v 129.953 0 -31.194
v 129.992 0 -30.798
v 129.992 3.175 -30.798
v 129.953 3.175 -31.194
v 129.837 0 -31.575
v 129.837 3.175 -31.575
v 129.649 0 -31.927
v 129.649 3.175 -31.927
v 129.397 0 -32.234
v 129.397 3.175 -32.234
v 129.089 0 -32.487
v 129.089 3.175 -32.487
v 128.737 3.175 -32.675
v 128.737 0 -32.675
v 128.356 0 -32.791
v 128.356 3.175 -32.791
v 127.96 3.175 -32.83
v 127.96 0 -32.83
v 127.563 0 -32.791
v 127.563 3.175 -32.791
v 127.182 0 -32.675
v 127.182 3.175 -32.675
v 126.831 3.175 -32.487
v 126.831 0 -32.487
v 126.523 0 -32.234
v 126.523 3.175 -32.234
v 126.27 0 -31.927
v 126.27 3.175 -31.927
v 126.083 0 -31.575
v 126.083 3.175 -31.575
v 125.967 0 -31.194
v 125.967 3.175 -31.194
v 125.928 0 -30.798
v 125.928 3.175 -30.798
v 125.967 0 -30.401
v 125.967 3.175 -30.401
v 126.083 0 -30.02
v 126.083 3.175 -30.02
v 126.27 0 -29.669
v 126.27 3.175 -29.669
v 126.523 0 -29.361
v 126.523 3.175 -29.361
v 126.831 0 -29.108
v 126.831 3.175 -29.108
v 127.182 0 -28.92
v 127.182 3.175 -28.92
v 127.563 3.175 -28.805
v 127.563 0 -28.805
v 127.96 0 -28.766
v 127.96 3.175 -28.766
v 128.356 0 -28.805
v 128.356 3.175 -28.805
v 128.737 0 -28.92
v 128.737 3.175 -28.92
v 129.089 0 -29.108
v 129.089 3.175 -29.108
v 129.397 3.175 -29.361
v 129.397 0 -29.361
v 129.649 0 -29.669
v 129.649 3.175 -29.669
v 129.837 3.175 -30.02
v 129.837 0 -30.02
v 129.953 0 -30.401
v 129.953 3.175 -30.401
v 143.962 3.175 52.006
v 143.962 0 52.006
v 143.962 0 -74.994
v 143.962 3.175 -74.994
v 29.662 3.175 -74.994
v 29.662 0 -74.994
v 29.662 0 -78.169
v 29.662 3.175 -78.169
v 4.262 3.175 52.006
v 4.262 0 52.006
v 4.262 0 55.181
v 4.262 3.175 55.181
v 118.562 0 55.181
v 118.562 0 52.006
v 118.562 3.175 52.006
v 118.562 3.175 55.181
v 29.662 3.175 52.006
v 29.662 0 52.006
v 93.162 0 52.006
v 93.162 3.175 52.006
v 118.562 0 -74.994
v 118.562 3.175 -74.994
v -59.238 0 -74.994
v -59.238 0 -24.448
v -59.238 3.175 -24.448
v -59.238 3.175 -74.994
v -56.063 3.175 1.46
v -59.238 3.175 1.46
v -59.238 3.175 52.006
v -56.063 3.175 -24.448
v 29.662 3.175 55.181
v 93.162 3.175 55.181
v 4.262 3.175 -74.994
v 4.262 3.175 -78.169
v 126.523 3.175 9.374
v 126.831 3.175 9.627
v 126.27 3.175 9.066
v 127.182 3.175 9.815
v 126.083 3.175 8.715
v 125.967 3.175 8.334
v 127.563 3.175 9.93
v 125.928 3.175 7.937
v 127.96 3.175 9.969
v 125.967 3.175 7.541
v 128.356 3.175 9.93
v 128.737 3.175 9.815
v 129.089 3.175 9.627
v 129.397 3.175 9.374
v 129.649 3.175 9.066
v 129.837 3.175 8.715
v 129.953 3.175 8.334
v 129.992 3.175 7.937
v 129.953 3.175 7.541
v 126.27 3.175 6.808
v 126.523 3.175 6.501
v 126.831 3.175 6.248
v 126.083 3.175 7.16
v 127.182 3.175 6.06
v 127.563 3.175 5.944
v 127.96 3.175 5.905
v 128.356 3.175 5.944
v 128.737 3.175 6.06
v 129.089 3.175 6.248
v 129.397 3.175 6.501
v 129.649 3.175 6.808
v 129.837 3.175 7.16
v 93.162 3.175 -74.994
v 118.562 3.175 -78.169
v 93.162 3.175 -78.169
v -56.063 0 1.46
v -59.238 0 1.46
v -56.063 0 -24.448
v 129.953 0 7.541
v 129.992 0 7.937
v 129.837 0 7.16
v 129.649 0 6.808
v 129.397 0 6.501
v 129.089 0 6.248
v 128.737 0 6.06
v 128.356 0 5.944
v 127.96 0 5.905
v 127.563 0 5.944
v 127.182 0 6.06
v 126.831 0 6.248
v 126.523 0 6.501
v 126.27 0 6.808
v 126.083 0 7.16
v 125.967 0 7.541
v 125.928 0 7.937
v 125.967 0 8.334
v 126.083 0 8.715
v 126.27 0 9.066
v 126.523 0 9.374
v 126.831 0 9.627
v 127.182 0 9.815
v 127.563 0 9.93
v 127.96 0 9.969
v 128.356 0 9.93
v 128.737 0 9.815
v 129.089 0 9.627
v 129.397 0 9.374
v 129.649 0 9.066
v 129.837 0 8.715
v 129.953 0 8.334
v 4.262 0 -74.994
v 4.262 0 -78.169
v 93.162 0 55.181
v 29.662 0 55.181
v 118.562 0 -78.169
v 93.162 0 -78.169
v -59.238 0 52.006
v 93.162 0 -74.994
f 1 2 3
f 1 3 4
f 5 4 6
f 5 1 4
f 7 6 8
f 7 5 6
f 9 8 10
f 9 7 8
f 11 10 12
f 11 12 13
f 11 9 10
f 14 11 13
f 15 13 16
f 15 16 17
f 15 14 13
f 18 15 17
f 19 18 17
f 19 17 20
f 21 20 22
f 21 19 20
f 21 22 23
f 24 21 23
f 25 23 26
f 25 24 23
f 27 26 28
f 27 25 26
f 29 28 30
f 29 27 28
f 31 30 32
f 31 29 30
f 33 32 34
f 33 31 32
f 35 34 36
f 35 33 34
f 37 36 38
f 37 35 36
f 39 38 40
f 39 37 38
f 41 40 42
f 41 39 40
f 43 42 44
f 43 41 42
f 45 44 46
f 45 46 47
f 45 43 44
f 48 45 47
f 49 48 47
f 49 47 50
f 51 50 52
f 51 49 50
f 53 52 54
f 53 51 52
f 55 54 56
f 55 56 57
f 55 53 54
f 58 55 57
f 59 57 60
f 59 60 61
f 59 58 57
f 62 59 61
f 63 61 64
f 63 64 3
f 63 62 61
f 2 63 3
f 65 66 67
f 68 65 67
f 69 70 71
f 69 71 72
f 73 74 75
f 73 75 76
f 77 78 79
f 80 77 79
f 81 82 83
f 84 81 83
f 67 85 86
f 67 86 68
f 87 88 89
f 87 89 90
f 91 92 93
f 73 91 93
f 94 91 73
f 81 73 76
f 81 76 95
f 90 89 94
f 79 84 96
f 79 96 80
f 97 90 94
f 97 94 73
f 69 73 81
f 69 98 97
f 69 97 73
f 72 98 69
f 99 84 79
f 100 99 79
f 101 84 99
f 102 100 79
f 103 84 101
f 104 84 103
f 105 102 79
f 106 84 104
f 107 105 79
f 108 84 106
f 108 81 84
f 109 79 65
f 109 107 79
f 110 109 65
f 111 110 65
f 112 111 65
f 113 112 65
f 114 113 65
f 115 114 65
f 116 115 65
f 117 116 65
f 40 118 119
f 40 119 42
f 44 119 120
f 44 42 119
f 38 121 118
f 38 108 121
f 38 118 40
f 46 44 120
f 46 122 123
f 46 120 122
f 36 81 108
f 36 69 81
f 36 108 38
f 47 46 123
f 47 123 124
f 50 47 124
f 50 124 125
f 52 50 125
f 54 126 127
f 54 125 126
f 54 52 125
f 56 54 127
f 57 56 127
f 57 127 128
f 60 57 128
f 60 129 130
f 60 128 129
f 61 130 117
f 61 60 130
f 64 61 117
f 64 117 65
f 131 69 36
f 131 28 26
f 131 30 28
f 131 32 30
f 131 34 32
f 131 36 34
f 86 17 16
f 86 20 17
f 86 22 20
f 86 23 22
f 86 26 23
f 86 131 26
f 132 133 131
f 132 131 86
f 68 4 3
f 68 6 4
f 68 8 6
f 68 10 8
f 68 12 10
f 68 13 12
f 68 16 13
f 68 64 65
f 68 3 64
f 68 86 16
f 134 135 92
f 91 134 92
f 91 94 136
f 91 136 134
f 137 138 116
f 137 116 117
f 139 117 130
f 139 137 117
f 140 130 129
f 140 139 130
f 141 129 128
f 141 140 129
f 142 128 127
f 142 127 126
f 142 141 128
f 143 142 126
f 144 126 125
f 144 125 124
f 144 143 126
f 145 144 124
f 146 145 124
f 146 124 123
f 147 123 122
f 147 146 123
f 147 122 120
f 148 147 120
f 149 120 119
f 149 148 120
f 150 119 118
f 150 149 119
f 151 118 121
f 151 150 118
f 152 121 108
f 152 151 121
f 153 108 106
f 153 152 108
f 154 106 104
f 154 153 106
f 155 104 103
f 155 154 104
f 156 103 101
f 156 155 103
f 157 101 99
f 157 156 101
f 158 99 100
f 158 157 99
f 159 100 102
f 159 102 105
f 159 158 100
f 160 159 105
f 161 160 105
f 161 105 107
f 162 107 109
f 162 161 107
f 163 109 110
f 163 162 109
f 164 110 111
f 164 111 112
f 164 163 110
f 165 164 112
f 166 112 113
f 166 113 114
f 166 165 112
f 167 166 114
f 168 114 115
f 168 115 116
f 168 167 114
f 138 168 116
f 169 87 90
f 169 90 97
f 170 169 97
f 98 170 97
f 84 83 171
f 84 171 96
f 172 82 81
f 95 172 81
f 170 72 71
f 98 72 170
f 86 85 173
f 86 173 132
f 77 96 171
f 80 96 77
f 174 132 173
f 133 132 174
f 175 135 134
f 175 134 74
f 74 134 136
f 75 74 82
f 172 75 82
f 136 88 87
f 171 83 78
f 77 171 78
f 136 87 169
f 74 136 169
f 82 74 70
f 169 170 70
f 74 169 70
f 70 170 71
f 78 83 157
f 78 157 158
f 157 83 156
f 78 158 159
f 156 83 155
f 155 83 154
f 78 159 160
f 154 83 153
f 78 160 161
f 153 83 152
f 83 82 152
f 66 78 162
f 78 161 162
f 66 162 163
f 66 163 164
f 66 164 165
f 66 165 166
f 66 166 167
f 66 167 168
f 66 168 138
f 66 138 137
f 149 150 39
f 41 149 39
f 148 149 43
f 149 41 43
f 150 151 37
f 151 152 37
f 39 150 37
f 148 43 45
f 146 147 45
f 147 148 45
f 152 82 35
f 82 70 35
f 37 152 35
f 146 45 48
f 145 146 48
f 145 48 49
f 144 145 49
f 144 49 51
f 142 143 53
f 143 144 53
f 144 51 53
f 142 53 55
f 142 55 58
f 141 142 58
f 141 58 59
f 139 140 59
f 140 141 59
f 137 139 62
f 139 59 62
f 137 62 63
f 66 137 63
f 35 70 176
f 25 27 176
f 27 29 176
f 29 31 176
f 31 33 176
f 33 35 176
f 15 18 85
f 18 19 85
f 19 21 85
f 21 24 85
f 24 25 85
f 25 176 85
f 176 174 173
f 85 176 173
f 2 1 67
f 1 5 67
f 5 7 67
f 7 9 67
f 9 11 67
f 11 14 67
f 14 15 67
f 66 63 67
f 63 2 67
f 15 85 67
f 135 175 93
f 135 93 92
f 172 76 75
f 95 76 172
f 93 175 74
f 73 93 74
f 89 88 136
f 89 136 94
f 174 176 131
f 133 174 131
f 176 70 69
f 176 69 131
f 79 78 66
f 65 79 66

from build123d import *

# Parameters (mm, degrees)
SKETCH1_W           = 203.2
SKETCH1_H           = 127
SKETCH1_R           = 2.032
BOSS_EXTRUDE1_DEPTH = 3.175
SKETCH5_W           = 25.4
SKETCH5_H           = 3.175
BOSS_EXTRUDE2_DEPTH = 3.175
SKETCH6_W           = 25.4
SKETCH6_H           = 3.175
BOSS_EXTRUDE3_DEPTH = 3.175
SKETCH7_W           = 25.908
SKETCH7_H           = 3.175
CUT_EXTRUDE1_DEPTH  = 3.175


with BuildPart() as part:
    # Sketch1 → Boss-Extrude1 (new body)
    with BuildSketch(Plane(origin=(0, 0, 0), x_dir=(1, 0, 0), z_dir=(0, 1, 0))):
        with Locations((42.361845493, 11.49358269)):
            Rectangle(SKETCH1_W, SKETCH1_H)
        with Locations((127.959845493, -7.93741731)):
            Circle(SKETCH1_R, mode=Mode.SUBTRACT)
        with Locations((127.959845493, 30.79758269)):
            Circle(SKETCH1_R, mode=Mode.SUBTRACT)
    extrude(amount=BOSS_EXTRUDE1_DEPTH)

    # Sketch5 → Boss-Extrude2 (add)
    with BuildSketch(Plane.XY.offset(52.00641731)):
        with Locations((16.961845493, 1.5875)):
            Rectangle(SKETCH5_W, SKETCH5_H)
        with Locations((105.861845493, 1.5875)):
            Rectangle(SKETCH5_W, SKETCH5_H)
    extrude(amount=BOSS_EXTRUDE2_DEPTH)

    # Sketch6 → Boss-Extrude3 (add)
    with BuildSketch(Plane(origin=(0, 0, -74.99358269), x_dir=(-1, 0, 0), z_dir=(0, 0, -1))):
        with Locations((-105.861845493, 1.5875)):
            Rectangle(SKETCH6_W, SKETCH6_H)
        with Locations((-16.961845493, 1.5875)):
            Rectangle(SKETCH6_W, SKETCH6_H)
    extrude(amount=BOSS_EXTRUDE3_DEPTH)

    # Sketch7 → Cut-Extrude1 (cut)
    with BuildSketch(Plane.ZY.offset(59.238154507)):
        with Locations((-11.49358269, 1.5875)):
            Rectangle(SKETCH7_W, SKETCH7_H)
    extrude(amount=-CUT_EXTRUDE1_DEPTH, mode=Mode.SUBTRACT)


solid = part.part
